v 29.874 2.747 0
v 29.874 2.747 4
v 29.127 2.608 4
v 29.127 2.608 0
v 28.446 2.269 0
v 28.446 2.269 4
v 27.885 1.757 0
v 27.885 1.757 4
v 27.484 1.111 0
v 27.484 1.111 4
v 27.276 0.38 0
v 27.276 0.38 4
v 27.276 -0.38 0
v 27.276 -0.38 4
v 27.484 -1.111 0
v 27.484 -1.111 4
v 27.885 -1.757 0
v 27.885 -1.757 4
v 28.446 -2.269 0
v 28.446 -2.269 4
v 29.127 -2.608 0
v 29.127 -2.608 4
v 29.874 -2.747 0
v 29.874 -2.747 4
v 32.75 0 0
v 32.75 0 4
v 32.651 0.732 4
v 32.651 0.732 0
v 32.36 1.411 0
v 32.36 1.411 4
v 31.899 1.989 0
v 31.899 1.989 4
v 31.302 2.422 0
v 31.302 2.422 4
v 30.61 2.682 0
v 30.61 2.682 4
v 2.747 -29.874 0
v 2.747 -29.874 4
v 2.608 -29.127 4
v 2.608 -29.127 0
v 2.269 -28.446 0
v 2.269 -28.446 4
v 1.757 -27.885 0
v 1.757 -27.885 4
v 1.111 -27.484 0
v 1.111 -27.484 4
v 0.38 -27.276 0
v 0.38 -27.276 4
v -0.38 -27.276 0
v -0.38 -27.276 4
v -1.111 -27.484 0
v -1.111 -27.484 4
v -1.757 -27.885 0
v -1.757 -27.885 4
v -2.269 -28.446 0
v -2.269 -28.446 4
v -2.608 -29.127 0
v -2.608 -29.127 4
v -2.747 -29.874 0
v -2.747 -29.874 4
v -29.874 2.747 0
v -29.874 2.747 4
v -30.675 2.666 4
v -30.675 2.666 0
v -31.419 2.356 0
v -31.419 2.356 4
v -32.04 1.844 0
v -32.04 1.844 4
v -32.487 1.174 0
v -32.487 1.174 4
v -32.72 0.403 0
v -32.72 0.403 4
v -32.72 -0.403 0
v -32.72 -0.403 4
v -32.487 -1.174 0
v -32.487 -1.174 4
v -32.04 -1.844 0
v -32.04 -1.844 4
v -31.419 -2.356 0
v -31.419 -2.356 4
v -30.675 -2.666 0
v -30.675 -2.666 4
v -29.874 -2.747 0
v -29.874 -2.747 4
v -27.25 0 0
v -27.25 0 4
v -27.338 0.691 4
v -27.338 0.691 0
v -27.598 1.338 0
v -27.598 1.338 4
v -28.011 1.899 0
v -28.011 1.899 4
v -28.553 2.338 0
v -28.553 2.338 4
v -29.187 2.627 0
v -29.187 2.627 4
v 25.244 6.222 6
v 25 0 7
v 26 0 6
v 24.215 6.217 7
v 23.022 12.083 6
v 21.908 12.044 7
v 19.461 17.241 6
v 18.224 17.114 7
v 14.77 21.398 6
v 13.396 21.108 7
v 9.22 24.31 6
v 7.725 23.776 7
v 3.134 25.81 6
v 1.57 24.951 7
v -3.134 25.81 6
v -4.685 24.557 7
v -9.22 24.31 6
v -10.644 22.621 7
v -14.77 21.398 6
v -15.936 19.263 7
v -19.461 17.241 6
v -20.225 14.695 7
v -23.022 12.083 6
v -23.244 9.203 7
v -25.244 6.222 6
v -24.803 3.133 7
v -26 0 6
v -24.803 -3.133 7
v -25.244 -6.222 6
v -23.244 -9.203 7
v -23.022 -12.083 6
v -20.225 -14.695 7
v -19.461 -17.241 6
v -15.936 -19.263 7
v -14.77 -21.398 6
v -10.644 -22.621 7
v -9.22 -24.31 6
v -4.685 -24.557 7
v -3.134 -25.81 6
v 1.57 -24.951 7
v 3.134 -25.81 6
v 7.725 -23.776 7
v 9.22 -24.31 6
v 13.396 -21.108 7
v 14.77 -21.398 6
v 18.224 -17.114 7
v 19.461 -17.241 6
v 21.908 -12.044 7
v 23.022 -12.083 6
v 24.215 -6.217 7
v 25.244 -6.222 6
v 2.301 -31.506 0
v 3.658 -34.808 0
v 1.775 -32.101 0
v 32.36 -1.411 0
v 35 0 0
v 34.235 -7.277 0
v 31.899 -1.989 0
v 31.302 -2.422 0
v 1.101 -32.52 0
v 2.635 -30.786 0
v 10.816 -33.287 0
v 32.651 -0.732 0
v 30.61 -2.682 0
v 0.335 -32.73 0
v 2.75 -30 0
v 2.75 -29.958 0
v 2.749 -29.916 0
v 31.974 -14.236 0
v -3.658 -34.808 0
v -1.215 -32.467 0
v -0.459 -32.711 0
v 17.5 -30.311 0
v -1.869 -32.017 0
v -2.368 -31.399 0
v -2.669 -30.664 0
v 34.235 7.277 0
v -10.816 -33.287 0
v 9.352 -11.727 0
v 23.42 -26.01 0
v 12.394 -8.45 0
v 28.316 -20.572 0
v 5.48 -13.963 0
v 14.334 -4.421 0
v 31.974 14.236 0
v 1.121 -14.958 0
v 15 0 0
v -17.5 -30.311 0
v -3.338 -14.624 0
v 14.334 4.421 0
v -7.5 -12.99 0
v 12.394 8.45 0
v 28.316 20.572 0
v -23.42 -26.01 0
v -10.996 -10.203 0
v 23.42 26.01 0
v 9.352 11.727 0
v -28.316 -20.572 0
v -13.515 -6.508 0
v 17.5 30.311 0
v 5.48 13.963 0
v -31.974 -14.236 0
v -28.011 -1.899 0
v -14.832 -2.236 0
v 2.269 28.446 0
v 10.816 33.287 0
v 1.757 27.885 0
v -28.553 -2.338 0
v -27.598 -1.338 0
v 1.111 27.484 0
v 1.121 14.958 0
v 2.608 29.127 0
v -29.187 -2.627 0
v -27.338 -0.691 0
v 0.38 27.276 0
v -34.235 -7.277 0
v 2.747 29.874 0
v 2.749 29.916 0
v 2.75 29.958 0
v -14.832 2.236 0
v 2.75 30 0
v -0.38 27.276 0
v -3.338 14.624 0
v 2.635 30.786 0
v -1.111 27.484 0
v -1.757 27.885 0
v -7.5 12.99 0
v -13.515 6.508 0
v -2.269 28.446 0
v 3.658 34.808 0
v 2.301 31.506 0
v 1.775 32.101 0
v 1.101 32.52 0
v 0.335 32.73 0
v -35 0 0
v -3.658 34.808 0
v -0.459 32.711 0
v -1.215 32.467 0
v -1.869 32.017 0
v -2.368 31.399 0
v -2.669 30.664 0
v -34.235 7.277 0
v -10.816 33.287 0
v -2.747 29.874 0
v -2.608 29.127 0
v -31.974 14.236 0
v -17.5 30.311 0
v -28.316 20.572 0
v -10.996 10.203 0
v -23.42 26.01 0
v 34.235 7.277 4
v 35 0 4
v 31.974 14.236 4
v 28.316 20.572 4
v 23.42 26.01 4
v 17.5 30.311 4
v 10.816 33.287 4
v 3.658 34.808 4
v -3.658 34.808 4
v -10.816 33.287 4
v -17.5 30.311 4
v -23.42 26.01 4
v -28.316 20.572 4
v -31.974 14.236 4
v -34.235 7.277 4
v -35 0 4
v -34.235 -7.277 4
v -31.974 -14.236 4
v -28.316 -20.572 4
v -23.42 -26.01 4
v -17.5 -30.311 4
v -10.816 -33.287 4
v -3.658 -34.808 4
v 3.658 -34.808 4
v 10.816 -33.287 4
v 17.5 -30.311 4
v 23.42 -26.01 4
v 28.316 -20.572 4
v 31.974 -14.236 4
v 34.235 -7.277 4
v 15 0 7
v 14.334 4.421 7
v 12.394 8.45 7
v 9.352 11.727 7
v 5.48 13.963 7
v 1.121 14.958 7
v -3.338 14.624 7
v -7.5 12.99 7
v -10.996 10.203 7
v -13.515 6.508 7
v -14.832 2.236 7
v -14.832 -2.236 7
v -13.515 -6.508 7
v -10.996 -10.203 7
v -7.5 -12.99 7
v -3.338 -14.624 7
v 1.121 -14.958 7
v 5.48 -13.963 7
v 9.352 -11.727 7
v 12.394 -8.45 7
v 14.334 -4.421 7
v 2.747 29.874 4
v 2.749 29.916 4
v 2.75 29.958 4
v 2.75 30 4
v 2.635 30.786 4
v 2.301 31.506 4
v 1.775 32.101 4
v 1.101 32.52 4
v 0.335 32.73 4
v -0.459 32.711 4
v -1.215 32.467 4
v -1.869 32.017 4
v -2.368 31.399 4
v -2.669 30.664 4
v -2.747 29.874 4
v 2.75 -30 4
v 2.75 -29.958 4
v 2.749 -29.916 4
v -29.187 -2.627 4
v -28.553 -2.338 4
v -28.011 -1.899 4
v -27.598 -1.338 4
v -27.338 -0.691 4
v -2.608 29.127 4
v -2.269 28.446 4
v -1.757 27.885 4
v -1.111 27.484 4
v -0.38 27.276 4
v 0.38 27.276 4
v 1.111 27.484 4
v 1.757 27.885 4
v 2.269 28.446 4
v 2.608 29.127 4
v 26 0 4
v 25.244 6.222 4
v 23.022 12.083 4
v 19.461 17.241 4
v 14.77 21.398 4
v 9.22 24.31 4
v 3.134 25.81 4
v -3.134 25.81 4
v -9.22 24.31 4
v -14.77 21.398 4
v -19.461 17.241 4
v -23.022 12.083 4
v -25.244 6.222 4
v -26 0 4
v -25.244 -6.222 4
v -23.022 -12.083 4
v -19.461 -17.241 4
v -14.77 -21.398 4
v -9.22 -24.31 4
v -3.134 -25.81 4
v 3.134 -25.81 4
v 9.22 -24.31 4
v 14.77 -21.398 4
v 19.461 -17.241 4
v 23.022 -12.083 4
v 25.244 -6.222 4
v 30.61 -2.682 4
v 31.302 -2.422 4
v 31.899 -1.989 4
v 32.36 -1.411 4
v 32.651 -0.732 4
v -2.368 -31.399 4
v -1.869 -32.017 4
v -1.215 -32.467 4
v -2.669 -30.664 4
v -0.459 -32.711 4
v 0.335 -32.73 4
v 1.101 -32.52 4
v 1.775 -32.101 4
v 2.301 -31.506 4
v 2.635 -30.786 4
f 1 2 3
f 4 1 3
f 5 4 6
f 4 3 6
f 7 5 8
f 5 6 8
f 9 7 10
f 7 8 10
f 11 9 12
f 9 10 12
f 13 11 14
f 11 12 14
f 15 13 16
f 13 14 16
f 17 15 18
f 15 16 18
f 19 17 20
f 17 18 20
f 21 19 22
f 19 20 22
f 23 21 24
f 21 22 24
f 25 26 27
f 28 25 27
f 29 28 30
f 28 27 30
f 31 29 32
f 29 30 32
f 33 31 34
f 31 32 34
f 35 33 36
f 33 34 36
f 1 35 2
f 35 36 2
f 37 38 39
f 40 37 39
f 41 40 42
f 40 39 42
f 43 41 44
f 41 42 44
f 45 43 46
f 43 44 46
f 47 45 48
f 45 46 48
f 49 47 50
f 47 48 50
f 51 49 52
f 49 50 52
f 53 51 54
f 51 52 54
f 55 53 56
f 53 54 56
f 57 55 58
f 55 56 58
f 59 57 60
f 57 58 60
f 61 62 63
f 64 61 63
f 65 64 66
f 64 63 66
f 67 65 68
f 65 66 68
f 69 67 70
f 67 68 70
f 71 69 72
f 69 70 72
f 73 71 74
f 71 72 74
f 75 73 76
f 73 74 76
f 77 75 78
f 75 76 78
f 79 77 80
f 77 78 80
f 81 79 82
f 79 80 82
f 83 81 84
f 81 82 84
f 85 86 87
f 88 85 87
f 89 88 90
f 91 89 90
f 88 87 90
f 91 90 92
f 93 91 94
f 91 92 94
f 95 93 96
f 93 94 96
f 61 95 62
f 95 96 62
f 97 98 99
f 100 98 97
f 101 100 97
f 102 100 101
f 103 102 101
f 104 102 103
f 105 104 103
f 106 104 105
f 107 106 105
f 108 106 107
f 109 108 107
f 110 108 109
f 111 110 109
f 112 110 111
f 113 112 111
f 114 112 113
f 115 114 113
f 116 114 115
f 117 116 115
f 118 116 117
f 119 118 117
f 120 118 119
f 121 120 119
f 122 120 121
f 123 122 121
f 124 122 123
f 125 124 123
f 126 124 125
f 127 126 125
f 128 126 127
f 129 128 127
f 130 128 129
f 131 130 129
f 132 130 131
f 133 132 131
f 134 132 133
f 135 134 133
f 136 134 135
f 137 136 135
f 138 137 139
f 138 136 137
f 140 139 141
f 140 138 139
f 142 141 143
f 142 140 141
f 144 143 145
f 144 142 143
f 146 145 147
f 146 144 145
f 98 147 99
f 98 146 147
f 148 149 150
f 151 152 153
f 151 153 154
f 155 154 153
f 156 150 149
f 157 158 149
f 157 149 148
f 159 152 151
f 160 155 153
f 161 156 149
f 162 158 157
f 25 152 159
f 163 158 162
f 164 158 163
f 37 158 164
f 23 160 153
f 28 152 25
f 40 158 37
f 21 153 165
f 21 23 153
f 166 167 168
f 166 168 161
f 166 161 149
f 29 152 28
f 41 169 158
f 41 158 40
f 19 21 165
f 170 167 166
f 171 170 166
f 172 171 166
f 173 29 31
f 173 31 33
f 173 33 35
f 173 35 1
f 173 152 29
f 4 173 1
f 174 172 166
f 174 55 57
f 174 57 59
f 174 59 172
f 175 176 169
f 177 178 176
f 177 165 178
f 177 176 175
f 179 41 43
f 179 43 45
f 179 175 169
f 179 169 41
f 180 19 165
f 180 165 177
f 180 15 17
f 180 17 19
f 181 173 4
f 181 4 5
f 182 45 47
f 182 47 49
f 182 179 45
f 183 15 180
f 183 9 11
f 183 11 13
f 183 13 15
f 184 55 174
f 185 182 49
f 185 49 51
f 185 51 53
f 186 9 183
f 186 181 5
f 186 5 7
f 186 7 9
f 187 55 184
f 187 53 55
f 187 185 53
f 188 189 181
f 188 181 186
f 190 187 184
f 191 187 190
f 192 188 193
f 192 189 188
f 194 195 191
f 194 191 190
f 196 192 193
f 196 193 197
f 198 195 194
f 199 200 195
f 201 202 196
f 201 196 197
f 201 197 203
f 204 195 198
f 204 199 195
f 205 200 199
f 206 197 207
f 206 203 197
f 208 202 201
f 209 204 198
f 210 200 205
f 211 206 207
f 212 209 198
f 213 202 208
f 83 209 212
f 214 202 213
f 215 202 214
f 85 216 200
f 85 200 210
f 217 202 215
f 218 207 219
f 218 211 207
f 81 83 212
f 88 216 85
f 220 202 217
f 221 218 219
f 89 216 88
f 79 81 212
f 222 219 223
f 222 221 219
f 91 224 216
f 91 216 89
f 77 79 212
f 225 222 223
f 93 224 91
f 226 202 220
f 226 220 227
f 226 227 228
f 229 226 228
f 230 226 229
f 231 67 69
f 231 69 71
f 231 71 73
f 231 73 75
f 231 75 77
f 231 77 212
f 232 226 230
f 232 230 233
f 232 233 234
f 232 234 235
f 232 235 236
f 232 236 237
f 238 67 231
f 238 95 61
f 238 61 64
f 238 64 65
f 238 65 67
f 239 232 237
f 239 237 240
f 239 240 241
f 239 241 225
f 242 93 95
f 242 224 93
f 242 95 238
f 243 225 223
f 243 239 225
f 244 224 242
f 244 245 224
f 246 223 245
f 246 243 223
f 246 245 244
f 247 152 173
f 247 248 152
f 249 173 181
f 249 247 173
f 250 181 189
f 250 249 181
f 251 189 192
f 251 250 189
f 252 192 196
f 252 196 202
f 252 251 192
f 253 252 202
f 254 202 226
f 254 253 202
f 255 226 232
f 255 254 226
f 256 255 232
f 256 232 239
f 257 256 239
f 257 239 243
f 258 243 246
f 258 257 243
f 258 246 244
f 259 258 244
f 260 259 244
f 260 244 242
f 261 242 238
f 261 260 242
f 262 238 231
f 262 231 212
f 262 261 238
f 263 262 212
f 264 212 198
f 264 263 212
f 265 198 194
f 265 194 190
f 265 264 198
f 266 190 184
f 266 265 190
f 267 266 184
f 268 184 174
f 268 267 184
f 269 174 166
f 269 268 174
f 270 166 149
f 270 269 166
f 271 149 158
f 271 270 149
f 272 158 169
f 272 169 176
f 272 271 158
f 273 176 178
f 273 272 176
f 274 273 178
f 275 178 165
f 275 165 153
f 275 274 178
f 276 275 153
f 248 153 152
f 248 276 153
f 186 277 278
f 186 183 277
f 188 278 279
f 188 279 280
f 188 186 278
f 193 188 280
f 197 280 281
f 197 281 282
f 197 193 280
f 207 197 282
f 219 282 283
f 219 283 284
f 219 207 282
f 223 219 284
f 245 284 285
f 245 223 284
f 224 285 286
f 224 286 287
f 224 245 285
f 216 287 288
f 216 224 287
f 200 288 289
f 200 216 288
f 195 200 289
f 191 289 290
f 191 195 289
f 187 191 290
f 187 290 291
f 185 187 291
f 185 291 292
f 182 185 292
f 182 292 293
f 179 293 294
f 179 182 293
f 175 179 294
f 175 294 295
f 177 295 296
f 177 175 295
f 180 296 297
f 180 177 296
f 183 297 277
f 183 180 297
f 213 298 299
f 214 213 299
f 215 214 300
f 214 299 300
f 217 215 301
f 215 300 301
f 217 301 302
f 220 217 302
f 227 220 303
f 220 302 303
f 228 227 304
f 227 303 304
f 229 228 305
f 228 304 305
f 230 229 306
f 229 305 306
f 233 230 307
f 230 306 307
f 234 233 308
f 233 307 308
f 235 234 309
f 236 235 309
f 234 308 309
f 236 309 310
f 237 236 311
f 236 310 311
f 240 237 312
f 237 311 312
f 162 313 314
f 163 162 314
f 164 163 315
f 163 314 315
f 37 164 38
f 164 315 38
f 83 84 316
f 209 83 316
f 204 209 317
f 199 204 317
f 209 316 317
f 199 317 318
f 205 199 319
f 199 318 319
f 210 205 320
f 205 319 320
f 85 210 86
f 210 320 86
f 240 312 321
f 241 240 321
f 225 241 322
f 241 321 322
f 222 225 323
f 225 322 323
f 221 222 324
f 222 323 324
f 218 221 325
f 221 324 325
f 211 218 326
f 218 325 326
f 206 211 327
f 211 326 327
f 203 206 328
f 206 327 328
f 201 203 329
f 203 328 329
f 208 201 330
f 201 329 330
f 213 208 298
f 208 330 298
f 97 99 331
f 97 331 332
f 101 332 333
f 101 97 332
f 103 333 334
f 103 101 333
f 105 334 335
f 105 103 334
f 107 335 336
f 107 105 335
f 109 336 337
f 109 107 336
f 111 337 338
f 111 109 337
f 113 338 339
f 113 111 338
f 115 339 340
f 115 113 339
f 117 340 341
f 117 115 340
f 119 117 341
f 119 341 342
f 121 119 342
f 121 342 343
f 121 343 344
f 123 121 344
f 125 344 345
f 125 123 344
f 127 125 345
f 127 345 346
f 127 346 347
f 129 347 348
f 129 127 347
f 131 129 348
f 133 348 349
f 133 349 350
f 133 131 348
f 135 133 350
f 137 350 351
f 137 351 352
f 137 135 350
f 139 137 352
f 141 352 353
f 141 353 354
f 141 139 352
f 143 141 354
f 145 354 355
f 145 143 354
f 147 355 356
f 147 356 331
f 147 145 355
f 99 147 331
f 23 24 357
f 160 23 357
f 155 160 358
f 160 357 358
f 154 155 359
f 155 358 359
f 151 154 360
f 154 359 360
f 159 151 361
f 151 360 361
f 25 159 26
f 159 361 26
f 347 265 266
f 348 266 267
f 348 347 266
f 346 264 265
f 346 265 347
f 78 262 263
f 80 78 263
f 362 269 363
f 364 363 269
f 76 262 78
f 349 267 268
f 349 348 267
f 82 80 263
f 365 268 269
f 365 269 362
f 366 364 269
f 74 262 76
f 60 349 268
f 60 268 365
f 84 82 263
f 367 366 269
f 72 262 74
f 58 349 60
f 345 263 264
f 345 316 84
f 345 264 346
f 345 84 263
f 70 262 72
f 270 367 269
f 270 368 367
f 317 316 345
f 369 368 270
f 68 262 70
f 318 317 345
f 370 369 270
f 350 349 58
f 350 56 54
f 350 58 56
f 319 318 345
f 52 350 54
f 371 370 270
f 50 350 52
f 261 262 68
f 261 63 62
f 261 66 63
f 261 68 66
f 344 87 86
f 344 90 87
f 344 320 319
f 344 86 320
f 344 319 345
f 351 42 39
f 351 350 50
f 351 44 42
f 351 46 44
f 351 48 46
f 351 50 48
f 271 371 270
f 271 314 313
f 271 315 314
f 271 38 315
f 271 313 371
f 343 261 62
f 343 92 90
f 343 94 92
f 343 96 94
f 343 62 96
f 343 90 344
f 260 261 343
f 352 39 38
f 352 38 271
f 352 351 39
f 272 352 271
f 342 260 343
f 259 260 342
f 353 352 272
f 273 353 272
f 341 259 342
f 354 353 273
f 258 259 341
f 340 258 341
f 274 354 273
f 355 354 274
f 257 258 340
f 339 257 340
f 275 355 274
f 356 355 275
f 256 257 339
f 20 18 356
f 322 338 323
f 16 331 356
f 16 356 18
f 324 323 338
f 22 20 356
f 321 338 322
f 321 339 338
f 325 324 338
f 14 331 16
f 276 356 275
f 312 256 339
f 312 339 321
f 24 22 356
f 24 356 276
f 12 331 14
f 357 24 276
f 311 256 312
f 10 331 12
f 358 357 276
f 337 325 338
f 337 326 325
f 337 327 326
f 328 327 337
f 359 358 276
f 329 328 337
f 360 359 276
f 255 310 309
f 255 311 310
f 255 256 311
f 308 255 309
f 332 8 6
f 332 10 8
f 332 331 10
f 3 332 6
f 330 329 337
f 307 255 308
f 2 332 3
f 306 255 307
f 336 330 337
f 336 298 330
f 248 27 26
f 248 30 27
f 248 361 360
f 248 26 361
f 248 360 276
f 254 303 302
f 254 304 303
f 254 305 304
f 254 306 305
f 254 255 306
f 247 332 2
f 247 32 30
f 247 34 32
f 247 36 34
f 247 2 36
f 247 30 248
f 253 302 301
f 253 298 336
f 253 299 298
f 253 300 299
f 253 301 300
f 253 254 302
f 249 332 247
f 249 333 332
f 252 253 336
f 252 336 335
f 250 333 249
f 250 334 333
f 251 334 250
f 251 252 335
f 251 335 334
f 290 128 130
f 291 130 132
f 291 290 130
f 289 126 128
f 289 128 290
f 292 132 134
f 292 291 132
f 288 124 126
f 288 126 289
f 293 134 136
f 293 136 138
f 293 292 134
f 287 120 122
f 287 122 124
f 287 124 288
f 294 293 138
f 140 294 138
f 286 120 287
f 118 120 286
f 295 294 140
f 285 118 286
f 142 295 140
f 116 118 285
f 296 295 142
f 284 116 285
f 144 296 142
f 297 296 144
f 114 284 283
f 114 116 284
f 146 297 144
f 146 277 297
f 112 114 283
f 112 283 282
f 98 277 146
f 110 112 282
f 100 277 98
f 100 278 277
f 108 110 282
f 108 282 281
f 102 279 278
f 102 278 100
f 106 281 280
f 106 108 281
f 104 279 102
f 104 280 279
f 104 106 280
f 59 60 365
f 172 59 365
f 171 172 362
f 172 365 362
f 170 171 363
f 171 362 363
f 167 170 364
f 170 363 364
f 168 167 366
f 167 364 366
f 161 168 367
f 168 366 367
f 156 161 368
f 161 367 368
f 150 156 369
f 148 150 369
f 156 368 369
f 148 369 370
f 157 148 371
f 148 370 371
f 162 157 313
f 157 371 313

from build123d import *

# Parameters (mm, degrees)
F2_SIZE  = 1
F4_DEPTH = 4


with BuildPart() as f1:
    # F0 (on Front) → F1 (revolve)
    with BuildSketch(Plane.XZ):
        Polygon((15, 7), (15, 0), (35, 0), (35, 4), (26, 4), (26, 7), align=None)
    revolve(axis=Axis((0, 0, 26.826651), (0, 0, 1)))

    # F2
    f2_edges = [f1.edges().sort_by_distance(p)[0] for p in [
        (-26, 0, 7),
    ]]
    chamfer(f2_edges, length=F2_SIZE)

    # F3 (on face) → F4 (cut)
    with BuildSketch(Plane.XY.offset(4)):
        with BuildLine():
            ThreePointArc((2.75, 30), (-0.063037, 32.749277), (-2.74711, 29.873958))
            ThreePointArc((-2.74711, 29.873958), (0, 27.25), (2.74711, 29.873958))
            ThreePointArc((2.74711, 29.873958), (2.749277, 29.936963), (2.75, 30))
        make_face()
        with BuildLine():
            ThreePointArc((-27.25, 0), (-28.011393, 1.899459), (-29.873958, 2.74711))
            ThreePointArc((-29.873958, 2.74711), (-32.75, 0), (-29.873958, -2.74711))
            ThreePointArc((-29.873958, -2.74711), (-28.011393, -1.899459), (-27.25, 0))
        make_face()
        with BuildLine():
            ThreePointArc((2.74711, -29.873958), (0, -27.25), (-2.74711, -29.873958))
            ThreePointArc((-2.74711, -29.873958), (-0.063037, -32.749277), (2.75, -30))
            ThreePointArc((2.75, -30), (2.749277, -29.936963), (2.74711, -29.873958))
        make_face()
        with BuildLine():
            ThreePointArc((32.75, 0), (31.899459, 1.988607), (29.873958, 2.74711))
            ThreePointArc((29.873958, 2.74711), (27.25, 0), (29.873958, -2.74711))
            ThreePointArc((29.873958, -2.74711), (31.899459, -1.988607), (32.75, 0))
        make_face()
    extrude(amount=-F4_DEPTH, mode=Mode.SUBTRACT)


solid = f1.part
